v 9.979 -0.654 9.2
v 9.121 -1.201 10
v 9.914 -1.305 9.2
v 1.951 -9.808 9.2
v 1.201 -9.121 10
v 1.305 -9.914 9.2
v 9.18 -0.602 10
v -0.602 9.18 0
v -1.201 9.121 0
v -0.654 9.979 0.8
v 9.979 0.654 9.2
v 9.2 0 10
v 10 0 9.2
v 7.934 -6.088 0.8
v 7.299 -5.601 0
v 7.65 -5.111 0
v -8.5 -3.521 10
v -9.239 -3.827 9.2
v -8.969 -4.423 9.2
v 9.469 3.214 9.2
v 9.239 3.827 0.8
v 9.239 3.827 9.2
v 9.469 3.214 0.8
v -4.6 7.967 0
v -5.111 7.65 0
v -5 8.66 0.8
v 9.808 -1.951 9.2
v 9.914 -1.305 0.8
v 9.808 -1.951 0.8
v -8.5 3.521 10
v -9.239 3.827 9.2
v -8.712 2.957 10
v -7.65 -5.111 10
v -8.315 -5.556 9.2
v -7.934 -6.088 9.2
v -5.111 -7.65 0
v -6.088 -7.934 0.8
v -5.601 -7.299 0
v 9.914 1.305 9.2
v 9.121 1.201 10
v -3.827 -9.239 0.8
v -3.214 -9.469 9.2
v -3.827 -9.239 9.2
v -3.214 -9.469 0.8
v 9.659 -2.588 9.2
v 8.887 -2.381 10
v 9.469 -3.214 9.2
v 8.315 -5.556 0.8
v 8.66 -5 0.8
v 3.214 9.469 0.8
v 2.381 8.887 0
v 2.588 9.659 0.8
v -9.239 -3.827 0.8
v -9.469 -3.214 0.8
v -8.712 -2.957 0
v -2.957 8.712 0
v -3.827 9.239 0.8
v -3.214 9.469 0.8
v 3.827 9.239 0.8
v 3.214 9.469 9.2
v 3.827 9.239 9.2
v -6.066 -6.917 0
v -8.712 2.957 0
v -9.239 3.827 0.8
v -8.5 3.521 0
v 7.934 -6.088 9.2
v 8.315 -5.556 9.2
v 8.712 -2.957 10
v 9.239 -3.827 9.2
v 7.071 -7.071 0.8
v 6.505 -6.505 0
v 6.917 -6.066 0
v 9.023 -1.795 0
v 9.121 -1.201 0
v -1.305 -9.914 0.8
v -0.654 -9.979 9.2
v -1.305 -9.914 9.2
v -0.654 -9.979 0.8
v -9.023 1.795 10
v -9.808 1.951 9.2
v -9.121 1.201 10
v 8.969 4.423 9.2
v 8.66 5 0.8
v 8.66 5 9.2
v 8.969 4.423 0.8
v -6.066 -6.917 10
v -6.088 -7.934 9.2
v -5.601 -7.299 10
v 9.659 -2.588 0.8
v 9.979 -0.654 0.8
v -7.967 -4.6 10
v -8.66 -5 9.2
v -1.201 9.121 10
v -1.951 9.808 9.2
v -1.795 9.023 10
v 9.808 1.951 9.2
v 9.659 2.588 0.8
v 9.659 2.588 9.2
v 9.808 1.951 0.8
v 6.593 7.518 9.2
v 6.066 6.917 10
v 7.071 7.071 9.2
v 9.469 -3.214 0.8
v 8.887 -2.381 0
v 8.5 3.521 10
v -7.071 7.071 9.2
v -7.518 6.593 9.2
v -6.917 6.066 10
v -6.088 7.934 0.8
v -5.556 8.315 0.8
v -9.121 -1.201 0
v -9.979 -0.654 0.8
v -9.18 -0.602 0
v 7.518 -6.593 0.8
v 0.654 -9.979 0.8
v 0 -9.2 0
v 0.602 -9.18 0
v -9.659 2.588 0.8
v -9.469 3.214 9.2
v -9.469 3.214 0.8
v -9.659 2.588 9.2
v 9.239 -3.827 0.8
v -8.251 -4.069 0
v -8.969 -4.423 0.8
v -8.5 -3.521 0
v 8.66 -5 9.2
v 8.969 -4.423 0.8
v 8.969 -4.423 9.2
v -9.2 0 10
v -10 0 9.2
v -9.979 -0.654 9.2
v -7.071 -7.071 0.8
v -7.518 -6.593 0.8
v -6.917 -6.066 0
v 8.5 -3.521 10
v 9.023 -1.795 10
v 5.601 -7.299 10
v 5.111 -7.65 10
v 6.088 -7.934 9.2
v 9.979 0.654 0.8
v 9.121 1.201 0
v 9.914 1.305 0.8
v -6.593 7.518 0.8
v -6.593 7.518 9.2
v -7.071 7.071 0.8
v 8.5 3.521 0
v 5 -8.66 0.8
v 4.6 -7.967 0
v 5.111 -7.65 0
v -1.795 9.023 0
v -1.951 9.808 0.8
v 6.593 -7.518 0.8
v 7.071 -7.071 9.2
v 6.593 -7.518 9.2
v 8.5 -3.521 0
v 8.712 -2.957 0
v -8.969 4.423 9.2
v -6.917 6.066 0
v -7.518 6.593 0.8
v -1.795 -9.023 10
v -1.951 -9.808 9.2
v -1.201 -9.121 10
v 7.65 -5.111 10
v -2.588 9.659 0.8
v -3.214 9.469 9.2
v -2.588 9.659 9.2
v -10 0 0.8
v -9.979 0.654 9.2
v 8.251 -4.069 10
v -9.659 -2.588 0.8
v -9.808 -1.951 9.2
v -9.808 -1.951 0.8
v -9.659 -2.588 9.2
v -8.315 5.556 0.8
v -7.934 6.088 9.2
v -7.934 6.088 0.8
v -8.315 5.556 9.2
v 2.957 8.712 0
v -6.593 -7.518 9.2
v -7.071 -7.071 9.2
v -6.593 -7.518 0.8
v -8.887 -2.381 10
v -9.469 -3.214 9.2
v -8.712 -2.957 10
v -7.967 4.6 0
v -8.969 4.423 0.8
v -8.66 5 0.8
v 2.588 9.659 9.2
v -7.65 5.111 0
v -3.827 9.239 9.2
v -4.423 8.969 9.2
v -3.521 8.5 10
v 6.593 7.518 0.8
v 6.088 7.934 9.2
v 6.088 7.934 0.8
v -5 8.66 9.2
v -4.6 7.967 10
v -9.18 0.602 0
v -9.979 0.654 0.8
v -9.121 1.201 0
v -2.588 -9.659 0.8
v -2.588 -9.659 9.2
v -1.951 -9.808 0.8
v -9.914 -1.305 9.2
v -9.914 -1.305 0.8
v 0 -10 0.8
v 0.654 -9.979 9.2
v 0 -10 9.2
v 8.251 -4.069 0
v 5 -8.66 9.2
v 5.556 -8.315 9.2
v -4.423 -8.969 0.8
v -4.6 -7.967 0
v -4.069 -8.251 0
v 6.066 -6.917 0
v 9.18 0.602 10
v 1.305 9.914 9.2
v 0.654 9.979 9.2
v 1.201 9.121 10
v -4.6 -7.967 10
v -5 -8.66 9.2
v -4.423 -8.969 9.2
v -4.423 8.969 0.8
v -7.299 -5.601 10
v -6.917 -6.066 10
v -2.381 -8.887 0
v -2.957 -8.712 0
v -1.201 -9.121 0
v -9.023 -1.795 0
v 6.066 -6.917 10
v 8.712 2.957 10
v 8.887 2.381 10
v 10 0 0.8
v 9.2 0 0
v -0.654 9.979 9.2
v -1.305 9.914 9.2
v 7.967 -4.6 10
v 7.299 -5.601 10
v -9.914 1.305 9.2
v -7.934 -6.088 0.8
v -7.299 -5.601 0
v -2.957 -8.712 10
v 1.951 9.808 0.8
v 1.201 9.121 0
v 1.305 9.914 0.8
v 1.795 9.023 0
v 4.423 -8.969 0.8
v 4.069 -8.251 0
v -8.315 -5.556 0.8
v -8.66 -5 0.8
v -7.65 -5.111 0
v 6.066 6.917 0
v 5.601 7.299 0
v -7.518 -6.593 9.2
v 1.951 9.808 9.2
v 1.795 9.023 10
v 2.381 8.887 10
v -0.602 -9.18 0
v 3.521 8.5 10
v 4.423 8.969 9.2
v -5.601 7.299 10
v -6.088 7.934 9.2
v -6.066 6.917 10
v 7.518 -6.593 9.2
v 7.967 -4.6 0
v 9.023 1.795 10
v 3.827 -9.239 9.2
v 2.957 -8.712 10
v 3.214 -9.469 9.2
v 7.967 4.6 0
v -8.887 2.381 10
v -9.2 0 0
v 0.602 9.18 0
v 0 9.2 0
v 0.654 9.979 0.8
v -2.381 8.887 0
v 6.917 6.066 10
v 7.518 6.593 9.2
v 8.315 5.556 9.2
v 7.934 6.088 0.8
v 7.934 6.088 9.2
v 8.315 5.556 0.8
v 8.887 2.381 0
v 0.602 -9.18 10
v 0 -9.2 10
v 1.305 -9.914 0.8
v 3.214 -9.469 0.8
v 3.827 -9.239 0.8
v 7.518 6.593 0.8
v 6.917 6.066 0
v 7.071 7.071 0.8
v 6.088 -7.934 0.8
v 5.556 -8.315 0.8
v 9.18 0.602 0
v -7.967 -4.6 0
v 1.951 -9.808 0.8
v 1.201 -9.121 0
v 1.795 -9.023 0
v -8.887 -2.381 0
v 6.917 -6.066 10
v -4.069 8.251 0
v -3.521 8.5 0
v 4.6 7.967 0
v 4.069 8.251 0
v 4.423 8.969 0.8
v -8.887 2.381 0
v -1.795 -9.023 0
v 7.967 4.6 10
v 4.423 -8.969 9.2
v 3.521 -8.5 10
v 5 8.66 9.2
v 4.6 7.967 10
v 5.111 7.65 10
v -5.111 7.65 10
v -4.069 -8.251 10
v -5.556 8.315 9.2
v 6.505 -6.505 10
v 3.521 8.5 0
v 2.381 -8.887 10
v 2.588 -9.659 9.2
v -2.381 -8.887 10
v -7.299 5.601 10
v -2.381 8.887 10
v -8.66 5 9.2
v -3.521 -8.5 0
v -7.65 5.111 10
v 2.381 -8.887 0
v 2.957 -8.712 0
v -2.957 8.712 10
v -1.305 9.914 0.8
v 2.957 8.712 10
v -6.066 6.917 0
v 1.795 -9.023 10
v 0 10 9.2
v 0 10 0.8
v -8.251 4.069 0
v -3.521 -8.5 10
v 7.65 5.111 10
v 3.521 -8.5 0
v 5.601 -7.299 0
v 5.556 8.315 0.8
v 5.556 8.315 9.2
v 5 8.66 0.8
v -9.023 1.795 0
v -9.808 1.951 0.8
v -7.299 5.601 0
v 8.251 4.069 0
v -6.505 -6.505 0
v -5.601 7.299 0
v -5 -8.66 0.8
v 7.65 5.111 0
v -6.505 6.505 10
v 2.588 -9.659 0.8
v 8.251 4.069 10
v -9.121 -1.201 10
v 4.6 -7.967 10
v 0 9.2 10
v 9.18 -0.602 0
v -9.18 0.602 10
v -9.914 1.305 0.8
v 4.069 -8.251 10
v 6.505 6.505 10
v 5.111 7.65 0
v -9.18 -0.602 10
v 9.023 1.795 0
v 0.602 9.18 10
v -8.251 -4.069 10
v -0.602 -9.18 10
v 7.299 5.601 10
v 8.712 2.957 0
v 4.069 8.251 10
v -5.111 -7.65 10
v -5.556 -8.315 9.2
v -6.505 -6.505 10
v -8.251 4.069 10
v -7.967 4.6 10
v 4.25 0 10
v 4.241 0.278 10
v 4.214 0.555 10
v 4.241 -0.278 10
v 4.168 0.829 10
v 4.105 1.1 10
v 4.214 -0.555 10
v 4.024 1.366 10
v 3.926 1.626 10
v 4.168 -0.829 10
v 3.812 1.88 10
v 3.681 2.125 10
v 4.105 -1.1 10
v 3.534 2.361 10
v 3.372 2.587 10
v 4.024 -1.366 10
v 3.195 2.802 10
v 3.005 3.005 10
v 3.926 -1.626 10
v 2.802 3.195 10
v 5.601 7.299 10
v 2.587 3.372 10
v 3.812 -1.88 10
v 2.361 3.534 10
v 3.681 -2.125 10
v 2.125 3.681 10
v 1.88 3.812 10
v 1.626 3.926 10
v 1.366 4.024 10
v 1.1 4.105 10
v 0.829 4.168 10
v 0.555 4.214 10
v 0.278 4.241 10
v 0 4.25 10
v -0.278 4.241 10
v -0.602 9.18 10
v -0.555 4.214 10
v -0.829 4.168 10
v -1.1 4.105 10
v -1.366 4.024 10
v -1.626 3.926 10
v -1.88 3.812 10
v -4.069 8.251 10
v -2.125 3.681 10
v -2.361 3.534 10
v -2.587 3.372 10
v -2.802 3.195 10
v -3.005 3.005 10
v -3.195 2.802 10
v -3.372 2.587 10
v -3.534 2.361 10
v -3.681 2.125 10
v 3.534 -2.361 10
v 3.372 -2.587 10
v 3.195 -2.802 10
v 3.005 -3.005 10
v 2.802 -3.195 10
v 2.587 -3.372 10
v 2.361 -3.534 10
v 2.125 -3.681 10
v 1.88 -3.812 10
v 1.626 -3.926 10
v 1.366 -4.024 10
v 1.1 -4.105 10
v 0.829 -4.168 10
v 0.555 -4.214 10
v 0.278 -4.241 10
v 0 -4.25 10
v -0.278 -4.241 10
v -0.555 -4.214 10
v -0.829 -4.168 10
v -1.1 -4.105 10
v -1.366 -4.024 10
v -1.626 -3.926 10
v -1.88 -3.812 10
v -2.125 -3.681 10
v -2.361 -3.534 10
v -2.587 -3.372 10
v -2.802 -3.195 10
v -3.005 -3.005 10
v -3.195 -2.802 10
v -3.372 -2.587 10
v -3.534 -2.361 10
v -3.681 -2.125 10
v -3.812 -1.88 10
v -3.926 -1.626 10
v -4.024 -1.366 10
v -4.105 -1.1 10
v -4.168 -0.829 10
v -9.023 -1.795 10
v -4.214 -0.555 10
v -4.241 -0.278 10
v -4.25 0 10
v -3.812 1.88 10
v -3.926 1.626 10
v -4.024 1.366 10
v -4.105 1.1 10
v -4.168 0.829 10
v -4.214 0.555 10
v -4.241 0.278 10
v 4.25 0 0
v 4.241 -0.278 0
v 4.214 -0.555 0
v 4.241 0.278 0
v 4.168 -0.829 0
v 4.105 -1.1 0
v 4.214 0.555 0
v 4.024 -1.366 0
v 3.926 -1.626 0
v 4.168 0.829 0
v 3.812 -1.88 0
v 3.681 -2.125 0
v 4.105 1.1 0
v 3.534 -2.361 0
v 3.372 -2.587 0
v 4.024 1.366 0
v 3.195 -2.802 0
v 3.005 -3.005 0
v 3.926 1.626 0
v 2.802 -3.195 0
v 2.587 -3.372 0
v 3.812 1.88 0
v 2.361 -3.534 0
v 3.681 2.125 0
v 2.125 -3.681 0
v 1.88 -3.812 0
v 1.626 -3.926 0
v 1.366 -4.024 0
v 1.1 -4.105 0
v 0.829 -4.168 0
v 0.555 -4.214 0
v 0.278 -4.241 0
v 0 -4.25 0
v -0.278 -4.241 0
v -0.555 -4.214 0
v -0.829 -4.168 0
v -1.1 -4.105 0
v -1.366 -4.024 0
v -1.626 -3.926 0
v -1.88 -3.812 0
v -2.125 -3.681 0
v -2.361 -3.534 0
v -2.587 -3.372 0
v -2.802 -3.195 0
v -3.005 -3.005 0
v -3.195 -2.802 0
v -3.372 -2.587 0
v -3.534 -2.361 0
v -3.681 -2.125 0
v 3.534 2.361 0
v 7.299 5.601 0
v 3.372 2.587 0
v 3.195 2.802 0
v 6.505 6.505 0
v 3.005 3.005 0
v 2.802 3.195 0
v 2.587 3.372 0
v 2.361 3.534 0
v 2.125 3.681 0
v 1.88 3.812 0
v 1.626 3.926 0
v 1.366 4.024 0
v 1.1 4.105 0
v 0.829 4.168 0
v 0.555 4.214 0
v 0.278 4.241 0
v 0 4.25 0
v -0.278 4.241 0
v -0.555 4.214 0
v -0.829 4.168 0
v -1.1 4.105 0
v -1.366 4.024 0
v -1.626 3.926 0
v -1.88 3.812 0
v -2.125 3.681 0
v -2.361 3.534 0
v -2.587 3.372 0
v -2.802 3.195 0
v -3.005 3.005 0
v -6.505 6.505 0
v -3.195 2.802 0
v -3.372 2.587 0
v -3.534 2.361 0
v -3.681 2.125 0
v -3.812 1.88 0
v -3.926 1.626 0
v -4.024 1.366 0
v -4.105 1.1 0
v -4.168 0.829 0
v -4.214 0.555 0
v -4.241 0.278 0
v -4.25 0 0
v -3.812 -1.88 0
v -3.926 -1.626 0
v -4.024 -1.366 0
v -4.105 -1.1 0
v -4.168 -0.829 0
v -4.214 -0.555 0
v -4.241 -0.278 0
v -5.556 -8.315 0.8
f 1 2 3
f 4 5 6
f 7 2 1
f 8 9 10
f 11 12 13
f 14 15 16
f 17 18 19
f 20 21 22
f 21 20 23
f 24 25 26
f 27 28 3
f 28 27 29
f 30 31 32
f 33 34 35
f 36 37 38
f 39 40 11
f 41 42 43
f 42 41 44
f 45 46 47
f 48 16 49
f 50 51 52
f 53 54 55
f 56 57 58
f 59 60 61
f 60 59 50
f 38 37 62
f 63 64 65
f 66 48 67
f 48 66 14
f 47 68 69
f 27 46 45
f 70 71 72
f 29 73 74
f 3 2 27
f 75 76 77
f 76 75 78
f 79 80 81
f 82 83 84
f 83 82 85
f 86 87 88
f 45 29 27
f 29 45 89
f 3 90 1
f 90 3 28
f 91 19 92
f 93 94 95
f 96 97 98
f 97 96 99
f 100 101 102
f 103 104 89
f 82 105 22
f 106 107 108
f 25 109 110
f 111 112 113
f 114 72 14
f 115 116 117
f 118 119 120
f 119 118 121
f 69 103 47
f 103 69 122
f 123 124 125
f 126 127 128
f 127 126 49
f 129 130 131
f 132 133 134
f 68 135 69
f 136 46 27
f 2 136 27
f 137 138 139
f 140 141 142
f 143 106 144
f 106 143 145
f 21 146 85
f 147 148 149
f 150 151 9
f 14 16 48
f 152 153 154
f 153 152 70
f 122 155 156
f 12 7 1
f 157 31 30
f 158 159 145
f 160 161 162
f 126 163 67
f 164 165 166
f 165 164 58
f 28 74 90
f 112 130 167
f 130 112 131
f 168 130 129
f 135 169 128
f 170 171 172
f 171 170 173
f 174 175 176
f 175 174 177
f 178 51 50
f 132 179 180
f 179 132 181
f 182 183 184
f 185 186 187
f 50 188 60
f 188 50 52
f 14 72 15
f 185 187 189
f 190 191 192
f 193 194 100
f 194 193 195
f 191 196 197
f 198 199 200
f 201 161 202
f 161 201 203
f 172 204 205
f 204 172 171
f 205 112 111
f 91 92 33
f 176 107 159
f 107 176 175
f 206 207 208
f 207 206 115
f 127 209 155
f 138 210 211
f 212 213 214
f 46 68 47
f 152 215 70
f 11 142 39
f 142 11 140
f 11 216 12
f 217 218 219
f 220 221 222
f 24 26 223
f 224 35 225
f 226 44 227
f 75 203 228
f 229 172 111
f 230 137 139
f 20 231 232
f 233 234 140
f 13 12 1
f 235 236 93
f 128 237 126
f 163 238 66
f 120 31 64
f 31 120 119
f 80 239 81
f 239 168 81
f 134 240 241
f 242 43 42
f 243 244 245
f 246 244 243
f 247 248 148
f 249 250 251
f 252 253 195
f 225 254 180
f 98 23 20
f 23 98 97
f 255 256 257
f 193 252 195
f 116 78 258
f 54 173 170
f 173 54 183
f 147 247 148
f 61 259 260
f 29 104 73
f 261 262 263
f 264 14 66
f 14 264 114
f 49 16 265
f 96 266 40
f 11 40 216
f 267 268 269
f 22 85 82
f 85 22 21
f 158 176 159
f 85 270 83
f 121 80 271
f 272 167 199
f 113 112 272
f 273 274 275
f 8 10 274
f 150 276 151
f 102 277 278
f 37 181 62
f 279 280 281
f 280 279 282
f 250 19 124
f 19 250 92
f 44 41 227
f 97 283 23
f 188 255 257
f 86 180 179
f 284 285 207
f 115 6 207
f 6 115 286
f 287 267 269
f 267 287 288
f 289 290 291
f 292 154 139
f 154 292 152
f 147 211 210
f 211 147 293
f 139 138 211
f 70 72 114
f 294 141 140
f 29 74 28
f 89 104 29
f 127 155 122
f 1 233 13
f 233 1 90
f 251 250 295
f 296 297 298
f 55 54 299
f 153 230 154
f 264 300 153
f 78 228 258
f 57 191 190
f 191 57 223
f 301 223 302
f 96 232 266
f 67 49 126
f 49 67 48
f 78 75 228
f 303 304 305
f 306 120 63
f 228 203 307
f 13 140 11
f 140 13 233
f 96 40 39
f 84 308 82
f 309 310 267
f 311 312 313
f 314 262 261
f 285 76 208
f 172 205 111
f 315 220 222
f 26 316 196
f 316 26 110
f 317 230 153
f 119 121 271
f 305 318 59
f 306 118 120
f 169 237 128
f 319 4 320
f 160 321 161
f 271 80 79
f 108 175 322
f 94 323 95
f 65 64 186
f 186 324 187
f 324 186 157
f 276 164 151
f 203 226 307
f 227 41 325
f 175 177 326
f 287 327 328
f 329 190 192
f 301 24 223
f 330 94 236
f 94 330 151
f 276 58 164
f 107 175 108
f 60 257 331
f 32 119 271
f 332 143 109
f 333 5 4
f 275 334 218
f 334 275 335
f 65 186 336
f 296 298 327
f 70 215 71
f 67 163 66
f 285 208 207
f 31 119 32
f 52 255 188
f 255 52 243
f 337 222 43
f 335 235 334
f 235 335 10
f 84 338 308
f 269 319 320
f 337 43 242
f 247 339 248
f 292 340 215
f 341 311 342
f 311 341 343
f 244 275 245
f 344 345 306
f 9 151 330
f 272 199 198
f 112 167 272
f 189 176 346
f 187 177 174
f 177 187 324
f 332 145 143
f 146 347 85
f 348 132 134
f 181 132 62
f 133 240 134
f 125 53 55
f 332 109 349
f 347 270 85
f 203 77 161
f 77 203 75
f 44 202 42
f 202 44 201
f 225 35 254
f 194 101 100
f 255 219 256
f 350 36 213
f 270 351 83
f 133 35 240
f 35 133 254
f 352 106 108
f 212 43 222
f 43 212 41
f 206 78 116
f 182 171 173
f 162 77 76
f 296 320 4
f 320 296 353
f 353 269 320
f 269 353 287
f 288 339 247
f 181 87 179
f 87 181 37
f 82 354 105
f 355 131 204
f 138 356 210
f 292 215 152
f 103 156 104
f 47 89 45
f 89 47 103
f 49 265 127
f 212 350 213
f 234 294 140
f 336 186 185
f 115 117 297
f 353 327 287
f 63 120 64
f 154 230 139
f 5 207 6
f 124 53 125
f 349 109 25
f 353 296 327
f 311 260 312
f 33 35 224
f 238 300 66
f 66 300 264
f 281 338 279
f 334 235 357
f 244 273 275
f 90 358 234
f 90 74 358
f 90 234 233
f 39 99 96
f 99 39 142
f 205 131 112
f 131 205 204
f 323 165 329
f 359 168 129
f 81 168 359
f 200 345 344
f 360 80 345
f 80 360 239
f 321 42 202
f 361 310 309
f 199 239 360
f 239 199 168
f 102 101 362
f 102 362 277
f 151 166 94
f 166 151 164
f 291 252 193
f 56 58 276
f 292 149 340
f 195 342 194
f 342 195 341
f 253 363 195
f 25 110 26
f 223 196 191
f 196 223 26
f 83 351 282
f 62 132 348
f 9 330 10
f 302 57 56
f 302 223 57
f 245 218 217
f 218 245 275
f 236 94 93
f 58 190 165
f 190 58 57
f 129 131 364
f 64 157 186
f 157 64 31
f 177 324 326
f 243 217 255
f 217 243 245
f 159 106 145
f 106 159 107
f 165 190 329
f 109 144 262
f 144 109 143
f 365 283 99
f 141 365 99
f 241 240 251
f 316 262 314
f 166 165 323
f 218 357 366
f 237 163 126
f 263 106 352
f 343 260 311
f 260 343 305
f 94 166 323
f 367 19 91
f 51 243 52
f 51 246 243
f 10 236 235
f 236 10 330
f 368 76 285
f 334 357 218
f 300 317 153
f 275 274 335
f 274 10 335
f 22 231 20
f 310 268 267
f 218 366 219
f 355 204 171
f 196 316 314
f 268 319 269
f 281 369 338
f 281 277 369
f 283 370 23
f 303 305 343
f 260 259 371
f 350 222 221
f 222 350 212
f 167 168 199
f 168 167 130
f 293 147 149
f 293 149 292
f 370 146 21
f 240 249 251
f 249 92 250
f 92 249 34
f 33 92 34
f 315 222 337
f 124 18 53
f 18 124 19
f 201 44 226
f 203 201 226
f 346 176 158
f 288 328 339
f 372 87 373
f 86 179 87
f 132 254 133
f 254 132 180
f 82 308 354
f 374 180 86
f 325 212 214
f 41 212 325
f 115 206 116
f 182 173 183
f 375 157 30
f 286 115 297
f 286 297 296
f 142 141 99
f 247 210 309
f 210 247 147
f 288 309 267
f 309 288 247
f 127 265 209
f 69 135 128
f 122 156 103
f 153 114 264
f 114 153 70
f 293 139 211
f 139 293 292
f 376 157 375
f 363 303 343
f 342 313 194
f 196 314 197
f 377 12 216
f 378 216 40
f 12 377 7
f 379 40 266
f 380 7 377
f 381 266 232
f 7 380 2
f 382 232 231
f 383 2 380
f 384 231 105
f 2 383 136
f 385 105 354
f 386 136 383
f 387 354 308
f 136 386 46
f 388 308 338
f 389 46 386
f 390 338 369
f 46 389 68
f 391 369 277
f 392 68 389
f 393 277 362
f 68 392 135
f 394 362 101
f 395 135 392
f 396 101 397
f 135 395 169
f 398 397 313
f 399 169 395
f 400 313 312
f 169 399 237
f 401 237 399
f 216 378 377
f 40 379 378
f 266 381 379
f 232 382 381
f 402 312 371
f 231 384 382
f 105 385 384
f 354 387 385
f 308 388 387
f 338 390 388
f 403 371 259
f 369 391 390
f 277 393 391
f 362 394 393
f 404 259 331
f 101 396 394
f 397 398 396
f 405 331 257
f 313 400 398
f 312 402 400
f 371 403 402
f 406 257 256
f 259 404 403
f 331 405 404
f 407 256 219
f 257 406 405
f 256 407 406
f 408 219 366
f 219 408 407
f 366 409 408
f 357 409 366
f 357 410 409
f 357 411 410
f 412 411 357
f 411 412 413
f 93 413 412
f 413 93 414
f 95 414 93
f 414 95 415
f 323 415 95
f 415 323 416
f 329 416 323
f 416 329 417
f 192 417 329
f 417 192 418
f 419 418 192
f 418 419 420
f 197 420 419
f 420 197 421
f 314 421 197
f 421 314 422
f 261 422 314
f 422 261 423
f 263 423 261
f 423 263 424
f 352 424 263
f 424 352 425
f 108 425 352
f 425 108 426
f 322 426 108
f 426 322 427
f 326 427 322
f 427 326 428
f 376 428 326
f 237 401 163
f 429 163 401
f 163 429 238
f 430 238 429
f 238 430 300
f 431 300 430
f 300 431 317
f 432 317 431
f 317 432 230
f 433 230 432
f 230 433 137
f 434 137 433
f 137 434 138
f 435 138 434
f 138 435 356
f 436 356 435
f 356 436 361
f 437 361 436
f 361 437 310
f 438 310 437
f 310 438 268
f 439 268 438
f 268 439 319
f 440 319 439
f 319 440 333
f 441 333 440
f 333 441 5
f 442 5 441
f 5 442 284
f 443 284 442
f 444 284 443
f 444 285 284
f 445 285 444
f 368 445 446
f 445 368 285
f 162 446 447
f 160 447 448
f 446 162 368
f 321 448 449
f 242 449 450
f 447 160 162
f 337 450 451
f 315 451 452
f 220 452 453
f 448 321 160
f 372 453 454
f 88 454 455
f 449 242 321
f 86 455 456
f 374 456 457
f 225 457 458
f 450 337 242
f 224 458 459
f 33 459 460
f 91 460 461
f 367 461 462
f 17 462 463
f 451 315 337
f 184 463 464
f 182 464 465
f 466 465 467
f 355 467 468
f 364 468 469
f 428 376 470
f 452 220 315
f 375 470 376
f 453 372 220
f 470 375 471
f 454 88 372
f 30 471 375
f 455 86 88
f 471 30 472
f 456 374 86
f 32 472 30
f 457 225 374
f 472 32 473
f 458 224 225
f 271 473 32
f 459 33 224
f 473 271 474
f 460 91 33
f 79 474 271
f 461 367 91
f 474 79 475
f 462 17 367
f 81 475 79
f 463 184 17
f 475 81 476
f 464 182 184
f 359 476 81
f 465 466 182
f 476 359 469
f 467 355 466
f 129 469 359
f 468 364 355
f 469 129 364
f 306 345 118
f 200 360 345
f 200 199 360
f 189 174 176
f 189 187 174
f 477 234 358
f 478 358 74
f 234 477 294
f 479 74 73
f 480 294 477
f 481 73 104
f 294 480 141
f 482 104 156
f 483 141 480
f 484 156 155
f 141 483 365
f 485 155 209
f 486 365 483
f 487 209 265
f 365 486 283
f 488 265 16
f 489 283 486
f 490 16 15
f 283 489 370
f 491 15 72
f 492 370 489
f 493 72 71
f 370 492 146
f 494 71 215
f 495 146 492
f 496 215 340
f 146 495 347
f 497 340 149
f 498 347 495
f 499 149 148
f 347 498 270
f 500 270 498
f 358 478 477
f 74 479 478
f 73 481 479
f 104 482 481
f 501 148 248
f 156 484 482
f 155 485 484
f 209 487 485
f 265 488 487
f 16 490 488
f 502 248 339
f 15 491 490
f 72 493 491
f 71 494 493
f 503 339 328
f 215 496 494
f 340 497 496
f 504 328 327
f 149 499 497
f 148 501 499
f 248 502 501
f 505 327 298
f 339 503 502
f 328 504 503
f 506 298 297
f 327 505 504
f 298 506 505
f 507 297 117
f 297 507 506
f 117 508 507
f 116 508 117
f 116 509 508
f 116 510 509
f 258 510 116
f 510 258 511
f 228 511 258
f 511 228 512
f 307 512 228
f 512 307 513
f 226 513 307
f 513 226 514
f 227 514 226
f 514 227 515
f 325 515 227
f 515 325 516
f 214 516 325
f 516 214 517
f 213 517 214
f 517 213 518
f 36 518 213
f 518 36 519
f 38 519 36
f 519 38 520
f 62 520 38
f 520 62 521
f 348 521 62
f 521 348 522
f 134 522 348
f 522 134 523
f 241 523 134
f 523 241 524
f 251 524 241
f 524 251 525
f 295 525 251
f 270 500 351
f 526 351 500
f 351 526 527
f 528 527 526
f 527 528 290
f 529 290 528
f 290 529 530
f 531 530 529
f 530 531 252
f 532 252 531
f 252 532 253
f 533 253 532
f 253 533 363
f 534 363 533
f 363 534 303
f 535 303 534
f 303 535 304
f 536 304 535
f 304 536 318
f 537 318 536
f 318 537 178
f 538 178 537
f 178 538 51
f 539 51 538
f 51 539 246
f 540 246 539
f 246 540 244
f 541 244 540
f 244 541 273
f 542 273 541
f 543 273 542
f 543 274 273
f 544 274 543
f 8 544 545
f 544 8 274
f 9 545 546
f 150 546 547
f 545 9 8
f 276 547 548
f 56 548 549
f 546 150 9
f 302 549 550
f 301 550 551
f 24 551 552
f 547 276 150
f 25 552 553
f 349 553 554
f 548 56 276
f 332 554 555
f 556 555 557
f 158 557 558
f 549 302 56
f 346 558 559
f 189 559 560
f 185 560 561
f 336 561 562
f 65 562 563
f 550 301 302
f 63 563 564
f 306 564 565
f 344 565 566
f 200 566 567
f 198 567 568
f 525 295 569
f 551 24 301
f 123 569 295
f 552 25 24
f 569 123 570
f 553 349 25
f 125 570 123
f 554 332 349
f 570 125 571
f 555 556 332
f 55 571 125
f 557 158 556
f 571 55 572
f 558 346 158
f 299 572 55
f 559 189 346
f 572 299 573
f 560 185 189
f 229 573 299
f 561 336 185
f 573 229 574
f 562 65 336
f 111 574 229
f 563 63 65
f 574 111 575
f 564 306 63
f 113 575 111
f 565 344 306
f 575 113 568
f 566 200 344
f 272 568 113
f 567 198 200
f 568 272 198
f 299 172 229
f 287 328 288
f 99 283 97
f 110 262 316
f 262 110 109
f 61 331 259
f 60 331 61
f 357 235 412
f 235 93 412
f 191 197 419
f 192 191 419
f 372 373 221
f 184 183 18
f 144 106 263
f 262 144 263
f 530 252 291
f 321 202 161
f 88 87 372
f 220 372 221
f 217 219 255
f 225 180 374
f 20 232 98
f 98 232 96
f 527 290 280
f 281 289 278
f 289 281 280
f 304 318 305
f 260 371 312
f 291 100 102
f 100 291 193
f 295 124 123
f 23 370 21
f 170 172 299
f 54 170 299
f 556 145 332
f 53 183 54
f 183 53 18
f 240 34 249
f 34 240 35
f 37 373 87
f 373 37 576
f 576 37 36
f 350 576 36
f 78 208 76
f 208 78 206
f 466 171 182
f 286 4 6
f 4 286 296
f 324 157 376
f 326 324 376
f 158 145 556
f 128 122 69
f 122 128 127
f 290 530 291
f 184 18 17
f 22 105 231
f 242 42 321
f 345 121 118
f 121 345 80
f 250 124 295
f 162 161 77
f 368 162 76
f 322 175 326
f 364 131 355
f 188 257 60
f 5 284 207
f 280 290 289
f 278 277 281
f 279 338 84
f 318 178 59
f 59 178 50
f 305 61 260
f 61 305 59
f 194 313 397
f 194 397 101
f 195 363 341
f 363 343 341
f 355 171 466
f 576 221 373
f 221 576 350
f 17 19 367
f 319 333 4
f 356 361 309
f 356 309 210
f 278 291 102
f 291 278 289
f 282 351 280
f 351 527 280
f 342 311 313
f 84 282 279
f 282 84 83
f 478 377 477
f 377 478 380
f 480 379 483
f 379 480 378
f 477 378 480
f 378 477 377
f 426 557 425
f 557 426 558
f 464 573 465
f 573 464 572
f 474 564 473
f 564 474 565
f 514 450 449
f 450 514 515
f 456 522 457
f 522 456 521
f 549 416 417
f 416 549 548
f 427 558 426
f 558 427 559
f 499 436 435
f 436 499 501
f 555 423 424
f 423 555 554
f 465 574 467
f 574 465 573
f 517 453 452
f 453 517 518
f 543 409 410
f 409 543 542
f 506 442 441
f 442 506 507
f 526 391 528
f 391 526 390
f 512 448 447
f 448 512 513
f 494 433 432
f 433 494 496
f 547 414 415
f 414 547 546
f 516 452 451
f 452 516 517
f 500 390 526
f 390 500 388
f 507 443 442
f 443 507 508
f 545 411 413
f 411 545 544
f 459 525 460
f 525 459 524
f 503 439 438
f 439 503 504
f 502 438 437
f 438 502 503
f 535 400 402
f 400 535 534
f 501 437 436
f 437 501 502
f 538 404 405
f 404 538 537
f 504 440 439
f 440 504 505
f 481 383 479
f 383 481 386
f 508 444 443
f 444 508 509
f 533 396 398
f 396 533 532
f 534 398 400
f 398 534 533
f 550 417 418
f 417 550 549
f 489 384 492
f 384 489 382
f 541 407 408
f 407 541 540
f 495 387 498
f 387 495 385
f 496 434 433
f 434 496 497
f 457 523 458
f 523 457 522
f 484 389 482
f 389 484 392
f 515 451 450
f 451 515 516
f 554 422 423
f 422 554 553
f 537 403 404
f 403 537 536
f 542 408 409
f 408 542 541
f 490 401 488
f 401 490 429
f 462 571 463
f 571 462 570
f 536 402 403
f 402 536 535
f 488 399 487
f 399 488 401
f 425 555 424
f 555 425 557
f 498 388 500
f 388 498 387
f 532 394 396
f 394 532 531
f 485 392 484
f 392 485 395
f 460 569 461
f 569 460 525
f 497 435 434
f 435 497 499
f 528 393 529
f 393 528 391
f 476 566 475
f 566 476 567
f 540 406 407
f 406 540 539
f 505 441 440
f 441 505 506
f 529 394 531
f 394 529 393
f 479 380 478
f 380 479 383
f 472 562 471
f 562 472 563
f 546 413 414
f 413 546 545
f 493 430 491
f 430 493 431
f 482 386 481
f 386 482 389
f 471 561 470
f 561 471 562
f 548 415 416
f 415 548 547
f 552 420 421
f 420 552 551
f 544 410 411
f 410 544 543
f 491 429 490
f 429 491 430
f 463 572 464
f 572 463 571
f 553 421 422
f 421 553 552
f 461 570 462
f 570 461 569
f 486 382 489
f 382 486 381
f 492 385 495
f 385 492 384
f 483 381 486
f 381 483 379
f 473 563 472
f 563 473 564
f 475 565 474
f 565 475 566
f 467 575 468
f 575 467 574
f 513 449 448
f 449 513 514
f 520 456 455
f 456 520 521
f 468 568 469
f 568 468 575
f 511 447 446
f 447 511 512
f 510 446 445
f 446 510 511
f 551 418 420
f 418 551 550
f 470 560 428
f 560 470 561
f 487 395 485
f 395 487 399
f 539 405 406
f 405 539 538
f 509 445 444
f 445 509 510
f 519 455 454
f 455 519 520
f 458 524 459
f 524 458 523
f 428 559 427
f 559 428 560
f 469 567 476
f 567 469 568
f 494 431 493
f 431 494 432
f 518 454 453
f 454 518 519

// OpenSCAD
// Втулка / проставка (B21). Параметры ниже переопределяет сервер: openscad -D outer_d=20 ...
// Все размеры в мм. Модель стоит на столе (z от 0 до height).

outer_d = 20;      // внешний диаметр (для шестигранника — размер под ключ)
inner_d = 8.5;     // диаметр отверстия
height = 10;       // высота
shape = "round";   // "round" | "hex"
chamfer = true;    // фаска 0.8 мм по верхней и нижней кромке

$fn = 96;          // гладкость окружностей

// Фаска не больше трети стенки и не выше трети высоты — иначе деталь «съедена» целиком.
wall = (outer_d - inner_d) / 2;
ch = chamfer ? min(0.8, wall / 3, height / 3) : 0;

// Внешнее тело: цилиндр или шестигранная призма с фасками (через hull двух сечений).
module body() {
    if (shape == "hex") {
        // Шестигранник задаём размером под ключ: диаметр описанной окружности = s / cos(30°).
        d_corner = outer_d / cos(30);
        hull() {
            translate([0, 0, ch]) cylinder(d = d_corner, h = height - 2 * ch, $fn = 6);
            cylinder(d = (outer_d - 2 * ch) / cos(30), h = height, $fn = 6);
        }
    } else {
        hull() {
            translate([0, 0, ch]) cylinder(d = outer_d, h = height - 2 * ch);
            cylinder(d = outer_d - 2 * ch, h = height);
        }
    }
}

difference() {
    body();
    // Отверстие чуть длиннее детали, чтобы не осталось плёнки на торцах.
    translate([0, 0, -1]) cylinder(d = inner_d, h = height + 2);
}
